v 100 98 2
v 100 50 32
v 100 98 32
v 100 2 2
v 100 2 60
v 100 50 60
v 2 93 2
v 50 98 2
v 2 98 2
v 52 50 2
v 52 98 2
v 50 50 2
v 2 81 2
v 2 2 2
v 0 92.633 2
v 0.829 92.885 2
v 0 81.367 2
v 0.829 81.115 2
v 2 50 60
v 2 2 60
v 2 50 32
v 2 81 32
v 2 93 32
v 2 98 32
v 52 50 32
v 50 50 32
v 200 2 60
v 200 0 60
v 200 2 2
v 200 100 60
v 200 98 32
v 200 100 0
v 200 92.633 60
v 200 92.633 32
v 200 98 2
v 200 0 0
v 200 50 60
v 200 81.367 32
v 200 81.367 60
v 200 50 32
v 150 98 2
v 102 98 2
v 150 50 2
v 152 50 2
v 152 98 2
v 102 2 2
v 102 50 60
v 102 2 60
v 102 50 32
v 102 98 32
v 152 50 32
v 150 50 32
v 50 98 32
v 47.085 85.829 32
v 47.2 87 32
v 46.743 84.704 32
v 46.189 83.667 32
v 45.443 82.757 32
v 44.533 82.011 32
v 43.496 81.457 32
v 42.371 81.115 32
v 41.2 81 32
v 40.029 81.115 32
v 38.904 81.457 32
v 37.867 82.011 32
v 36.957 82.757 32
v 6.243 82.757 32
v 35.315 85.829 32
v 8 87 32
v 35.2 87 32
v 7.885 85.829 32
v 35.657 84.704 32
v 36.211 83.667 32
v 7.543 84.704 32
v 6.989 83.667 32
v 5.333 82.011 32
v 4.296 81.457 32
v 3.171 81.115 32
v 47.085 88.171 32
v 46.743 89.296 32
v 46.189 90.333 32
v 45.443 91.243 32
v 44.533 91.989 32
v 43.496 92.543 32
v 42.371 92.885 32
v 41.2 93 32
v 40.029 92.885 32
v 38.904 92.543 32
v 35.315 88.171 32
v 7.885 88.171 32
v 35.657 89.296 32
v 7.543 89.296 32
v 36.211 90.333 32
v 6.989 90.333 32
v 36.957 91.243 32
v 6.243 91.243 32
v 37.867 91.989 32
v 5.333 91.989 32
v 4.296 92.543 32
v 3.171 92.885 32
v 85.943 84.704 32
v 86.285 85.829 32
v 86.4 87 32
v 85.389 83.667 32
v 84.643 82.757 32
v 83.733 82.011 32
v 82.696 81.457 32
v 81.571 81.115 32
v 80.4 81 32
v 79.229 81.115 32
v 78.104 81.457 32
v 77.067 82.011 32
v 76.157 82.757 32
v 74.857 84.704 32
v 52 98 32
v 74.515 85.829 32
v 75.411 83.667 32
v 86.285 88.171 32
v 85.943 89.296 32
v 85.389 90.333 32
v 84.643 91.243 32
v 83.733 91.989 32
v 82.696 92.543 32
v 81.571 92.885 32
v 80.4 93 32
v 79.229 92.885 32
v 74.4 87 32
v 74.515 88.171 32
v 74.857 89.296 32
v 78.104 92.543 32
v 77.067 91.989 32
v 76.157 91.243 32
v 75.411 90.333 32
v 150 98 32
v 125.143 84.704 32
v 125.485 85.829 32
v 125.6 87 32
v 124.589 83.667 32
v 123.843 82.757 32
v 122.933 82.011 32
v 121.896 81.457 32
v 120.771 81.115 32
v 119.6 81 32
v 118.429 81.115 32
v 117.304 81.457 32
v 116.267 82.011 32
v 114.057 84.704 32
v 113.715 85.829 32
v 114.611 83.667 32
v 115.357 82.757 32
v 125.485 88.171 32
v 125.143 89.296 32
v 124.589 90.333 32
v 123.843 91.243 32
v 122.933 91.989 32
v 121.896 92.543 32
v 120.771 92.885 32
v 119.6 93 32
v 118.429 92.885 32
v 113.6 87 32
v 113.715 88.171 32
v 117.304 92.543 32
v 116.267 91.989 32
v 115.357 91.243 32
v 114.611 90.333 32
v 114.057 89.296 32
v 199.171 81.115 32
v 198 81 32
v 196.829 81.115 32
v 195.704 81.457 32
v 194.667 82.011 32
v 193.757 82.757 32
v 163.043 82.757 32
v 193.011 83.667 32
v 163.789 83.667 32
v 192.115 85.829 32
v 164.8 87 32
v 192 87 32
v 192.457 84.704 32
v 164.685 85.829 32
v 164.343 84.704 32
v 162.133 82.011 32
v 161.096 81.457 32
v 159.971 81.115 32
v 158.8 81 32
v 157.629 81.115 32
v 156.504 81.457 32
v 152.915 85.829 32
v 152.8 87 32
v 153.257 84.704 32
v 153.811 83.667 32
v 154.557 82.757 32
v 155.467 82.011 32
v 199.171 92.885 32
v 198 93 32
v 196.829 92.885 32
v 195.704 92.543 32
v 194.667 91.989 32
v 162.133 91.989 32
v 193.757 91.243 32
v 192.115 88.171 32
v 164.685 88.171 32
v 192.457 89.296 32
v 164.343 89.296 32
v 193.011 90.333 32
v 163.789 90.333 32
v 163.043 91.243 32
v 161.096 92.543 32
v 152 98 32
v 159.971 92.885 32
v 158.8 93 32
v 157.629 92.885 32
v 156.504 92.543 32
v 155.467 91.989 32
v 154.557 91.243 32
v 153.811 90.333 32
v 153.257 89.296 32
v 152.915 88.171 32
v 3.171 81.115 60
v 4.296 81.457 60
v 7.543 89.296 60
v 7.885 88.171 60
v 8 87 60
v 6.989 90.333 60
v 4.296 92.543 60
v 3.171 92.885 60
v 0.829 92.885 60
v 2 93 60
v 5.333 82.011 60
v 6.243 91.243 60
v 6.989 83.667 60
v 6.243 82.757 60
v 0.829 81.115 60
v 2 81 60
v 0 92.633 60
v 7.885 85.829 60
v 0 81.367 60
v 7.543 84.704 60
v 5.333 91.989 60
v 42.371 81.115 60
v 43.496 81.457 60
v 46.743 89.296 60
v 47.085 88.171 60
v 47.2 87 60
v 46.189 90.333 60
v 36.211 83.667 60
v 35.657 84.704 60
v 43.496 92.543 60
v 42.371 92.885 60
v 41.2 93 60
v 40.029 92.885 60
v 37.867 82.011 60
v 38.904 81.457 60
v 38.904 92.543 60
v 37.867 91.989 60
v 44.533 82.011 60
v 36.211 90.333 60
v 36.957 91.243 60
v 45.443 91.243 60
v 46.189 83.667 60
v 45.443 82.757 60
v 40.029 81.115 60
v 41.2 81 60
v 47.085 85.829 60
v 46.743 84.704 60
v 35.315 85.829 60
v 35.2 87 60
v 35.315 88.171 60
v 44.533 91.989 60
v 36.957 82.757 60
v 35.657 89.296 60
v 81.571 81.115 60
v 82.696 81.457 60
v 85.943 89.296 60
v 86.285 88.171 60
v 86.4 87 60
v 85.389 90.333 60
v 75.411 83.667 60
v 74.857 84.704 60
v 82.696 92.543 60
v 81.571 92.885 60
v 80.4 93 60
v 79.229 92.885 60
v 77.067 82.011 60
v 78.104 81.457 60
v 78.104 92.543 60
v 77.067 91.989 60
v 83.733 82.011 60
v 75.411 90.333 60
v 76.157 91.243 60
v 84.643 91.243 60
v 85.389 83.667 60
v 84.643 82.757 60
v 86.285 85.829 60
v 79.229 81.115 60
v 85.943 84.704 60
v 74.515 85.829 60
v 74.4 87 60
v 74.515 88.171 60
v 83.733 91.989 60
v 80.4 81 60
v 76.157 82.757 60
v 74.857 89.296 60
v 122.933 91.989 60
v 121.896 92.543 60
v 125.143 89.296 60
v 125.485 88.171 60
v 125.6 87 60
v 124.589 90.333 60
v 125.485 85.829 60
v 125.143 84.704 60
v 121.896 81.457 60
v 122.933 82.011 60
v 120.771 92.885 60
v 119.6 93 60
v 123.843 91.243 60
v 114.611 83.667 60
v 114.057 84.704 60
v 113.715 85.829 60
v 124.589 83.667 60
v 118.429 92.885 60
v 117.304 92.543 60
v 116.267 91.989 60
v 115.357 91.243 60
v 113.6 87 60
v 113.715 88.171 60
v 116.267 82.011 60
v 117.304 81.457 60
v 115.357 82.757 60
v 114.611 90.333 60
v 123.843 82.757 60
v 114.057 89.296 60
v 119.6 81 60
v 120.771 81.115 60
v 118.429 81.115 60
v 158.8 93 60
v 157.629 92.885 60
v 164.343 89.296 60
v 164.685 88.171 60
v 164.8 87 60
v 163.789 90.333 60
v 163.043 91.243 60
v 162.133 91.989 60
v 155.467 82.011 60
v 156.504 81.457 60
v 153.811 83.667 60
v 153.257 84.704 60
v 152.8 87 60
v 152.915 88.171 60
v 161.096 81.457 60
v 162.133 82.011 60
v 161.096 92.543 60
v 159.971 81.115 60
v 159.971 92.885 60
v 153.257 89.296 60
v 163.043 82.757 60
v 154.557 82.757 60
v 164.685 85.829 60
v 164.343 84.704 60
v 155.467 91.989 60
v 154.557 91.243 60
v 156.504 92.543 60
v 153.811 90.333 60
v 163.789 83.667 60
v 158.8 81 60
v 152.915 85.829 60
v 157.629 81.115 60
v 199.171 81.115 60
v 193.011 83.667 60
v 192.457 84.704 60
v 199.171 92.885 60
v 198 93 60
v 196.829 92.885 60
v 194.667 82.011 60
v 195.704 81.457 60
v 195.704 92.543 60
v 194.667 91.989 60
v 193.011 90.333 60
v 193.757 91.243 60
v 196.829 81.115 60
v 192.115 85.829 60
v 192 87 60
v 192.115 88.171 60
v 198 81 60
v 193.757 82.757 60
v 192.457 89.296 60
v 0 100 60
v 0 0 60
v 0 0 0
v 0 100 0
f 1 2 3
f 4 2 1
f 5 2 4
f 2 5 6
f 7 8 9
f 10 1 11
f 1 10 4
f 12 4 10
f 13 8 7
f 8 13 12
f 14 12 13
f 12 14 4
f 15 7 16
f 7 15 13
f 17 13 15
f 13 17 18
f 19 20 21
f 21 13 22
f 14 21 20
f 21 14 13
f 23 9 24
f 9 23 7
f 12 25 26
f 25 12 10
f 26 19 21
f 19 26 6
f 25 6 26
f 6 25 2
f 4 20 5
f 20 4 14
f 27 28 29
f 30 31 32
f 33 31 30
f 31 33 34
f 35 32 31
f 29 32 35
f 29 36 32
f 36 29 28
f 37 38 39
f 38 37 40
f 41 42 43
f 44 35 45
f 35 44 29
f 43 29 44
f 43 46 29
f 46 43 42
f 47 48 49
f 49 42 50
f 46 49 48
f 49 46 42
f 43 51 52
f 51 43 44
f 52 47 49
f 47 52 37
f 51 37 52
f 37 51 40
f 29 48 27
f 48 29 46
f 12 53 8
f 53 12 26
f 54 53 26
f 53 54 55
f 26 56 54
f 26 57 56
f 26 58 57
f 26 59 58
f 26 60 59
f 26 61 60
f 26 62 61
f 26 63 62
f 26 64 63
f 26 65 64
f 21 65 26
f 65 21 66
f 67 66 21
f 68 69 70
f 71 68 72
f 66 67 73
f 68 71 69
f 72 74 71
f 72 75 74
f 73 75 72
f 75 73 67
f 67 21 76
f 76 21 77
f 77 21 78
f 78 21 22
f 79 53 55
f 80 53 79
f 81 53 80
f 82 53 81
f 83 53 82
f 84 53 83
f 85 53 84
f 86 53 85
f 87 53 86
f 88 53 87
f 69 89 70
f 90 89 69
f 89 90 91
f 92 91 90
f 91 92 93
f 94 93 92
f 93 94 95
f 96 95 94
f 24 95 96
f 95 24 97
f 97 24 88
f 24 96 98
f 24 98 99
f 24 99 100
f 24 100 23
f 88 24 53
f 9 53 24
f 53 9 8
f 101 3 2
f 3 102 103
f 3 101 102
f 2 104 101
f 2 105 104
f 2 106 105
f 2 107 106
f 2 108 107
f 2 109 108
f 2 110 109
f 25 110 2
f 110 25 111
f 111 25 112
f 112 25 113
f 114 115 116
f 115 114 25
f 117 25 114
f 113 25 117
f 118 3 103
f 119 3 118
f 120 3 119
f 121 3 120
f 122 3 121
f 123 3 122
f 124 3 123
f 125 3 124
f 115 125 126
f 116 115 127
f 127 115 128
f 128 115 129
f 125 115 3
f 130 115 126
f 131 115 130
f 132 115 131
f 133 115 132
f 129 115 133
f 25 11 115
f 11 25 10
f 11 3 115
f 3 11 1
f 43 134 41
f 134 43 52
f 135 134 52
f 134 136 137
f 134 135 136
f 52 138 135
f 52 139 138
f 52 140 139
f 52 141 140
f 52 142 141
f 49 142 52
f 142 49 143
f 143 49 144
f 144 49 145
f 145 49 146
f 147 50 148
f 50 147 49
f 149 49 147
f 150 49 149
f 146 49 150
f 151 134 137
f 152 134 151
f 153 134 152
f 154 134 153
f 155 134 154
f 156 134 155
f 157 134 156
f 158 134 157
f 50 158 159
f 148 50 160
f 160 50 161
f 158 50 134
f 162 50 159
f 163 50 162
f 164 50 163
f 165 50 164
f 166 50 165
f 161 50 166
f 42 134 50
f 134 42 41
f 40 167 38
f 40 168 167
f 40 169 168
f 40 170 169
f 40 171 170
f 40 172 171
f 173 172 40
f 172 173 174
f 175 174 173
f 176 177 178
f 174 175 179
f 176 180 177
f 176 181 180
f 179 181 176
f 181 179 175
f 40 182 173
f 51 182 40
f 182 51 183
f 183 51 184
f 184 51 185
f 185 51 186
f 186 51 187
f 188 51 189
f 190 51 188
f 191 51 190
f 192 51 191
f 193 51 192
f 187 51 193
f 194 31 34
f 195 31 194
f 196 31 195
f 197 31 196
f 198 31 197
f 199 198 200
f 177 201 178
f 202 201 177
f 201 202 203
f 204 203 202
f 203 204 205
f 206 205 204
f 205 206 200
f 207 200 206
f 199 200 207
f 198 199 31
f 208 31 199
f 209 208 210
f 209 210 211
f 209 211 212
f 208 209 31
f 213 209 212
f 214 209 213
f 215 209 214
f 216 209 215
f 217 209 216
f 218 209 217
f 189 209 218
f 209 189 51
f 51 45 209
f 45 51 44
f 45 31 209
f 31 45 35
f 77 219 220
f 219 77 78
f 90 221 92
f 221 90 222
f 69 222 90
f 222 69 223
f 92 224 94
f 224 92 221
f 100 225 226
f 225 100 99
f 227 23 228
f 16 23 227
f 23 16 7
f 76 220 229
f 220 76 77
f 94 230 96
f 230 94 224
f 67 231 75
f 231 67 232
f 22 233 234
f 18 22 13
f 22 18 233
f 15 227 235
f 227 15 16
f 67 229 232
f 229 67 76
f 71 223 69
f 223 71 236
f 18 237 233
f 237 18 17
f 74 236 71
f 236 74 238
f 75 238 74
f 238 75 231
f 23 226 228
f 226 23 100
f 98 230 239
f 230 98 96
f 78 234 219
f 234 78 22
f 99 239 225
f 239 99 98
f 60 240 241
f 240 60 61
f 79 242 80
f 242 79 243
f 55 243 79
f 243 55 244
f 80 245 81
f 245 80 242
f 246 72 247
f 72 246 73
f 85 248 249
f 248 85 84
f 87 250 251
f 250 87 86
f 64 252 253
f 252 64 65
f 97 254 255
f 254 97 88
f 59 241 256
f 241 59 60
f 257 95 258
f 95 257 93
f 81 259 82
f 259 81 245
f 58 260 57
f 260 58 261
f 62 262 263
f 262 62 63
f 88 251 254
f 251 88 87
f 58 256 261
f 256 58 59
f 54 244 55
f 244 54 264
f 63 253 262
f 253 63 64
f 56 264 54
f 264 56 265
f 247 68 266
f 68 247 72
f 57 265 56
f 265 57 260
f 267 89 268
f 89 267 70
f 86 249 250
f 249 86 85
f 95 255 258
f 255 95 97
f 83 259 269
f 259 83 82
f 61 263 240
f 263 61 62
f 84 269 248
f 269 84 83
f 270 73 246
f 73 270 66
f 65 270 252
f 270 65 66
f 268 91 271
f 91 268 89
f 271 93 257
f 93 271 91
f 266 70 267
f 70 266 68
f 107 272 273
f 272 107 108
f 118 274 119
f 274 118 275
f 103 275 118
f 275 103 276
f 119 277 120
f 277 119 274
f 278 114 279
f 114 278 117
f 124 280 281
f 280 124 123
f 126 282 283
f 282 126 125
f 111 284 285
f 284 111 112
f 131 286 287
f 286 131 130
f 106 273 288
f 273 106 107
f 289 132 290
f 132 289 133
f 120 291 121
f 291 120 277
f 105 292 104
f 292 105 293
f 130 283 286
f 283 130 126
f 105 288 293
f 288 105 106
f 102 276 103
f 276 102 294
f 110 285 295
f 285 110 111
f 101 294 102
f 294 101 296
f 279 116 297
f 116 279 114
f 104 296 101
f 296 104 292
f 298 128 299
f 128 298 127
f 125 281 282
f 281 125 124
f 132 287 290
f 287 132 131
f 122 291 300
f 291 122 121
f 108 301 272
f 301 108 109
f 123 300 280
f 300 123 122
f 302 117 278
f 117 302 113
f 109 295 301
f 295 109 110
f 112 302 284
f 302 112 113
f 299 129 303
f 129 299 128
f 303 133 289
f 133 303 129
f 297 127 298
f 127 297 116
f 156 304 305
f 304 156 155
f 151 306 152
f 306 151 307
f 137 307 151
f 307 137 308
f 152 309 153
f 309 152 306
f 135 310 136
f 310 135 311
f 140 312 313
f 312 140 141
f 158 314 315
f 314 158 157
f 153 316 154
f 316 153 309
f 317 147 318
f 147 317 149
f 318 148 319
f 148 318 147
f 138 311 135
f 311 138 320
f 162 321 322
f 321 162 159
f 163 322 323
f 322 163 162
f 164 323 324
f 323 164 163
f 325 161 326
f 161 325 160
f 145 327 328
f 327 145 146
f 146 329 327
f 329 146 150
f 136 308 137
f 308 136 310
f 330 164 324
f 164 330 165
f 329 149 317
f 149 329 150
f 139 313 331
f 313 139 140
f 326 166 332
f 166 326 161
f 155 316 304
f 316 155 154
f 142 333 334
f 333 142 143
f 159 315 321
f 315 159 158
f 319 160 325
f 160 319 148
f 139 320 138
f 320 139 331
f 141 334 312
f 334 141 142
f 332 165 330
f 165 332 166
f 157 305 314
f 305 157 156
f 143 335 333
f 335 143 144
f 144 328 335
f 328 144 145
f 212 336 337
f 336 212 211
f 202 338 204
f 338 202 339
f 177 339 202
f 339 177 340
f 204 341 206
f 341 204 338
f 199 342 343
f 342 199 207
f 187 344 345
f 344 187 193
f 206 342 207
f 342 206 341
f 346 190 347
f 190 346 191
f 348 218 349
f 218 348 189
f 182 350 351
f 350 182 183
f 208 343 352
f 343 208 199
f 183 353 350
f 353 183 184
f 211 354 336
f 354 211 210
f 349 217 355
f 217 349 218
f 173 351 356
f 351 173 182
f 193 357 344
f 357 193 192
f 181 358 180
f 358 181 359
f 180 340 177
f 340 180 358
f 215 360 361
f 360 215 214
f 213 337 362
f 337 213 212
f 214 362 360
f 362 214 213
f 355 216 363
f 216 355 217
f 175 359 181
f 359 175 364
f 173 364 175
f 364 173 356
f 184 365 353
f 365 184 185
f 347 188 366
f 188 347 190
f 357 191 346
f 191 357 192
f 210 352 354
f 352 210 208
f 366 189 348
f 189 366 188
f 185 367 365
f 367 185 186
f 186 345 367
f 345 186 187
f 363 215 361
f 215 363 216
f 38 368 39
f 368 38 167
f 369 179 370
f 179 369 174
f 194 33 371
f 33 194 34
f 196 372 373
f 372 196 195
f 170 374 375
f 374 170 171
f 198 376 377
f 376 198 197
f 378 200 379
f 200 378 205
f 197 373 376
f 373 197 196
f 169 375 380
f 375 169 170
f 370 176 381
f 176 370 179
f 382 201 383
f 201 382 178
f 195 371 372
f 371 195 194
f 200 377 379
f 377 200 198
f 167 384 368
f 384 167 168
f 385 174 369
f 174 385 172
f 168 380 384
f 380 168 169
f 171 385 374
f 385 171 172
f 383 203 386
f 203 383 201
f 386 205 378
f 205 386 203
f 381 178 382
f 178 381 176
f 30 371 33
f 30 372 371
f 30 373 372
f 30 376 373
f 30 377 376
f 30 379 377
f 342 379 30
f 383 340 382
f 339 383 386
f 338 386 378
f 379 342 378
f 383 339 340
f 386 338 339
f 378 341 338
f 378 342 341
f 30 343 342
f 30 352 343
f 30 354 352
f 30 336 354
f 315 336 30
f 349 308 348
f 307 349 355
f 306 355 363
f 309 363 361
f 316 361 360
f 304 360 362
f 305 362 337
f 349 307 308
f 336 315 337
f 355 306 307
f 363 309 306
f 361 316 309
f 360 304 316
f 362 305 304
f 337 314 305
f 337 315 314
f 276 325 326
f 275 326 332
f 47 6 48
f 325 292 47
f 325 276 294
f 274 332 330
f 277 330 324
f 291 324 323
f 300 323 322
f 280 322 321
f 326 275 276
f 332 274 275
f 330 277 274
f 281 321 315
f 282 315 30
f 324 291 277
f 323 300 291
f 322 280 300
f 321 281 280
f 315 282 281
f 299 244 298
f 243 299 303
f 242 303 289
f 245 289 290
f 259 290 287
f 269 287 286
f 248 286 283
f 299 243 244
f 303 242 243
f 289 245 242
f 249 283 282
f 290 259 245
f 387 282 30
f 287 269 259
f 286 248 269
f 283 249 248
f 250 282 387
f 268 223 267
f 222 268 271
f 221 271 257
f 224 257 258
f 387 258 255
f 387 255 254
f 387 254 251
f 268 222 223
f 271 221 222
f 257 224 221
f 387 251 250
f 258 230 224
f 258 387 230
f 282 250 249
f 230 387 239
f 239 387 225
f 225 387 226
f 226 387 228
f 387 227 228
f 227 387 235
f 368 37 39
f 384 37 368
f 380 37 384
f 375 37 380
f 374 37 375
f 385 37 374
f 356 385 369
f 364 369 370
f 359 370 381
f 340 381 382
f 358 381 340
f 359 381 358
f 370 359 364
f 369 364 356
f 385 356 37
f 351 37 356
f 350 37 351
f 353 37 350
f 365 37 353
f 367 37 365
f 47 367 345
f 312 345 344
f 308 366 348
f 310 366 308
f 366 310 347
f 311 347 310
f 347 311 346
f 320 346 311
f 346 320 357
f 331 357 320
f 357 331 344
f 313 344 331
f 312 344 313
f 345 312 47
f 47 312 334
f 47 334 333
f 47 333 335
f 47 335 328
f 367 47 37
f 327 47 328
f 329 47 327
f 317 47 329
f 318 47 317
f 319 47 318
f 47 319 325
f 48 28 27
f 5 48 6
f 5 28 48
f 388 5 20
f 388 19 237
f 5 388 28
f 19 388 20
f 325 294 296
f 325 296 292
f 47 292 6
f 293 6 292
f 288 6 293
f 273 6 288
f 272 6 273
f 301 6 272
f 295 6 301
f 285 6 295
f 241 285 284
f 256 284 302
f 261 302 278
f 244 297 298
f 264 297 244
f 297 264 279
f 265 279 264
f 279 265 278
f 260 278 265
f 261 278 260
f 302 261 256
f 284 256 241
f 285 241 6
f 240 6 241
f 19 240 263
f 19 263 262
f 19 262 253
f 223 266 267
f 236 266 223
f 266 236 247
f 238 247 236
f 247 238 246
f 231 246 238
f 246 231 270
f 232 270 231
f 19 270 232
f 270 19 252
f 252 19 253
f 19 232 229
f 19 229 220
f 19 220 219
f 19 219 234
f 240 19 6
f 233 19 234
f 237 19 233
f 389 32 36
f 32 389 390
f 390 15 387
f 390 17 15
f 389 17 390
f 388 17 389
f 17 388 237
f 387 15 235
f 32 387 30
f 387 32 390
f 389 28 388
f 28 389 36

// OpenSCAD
// Parametric Desk Organizer
// A customizable desk organizer with multiple compartments

// ============================== PARAMETERS ==============================
// Main dimensions
organizer_width = 200;        // Total width of organizer
organizer_depth = 100;        // Total depth of organizer
organizer_height = 60;        // Height of compartments
wall_thickness = 2;           // Wall thickness

// Compartment configuration
large_compartments = 2;       // Number of large compartments
small_compartments = 4;       // Number of small compartments
pen_holes = 6;                // Number of pen holes
pen_hole_diameter = 12;       // Diameter of pen holes

// ============================== MODULES ==============================

module desk_organizer() {
    difference() {
        // Main body
        cube([organizer_width, organizer_depth, organizer_height]);
        
        // Large compartments
        translate([wall_thickness, wall_thickness, wall_thickness])
        for (i = [0:large_compartments-1]) {
            translate([i * (organizer_width/large_compartments), 0, 0])
            cube([
                (organizer_width/large_compartments) - wall_thickness,
                (organizer_depth/2) - wall_thickness,
                organizer_height
            ]);
        }
        
        // Small compartments
        translate([wall_thickness, organizer_depth/2, wall_thickness])
        for (i = [0:small_compartments-1]) {
            translate([i * (organizer_width/small_compartments), 0, 0])
            cube([
                (organizer_width/small_compartments) - wall_thickness,
                (organizer_depth/2) - wall_thickness,
                organizer_height/2
            ]);
        }
        
        // Pen holes
        for (i = [0:pen_holes-1]) {
            translate([
                wall_thickness + (i * (organizer_width - 2*wall_thickness)/(pen_holes-1)),
                organizer_depth - wall_thickness - pen_hole_diameter/2 - 5,
                wall_thickness
            ])
            cylinder(d=pen_hole_diameter, h=organizer_height, $fn=32);
        }
    }
}

// ============================== MAIN ==============================
desk_organizer();

// ============================== PRINT NOTES ==============================
// Print upright as shown
// No supports needed
// Layer height: 0.2mm
// Infill: 15-20%
